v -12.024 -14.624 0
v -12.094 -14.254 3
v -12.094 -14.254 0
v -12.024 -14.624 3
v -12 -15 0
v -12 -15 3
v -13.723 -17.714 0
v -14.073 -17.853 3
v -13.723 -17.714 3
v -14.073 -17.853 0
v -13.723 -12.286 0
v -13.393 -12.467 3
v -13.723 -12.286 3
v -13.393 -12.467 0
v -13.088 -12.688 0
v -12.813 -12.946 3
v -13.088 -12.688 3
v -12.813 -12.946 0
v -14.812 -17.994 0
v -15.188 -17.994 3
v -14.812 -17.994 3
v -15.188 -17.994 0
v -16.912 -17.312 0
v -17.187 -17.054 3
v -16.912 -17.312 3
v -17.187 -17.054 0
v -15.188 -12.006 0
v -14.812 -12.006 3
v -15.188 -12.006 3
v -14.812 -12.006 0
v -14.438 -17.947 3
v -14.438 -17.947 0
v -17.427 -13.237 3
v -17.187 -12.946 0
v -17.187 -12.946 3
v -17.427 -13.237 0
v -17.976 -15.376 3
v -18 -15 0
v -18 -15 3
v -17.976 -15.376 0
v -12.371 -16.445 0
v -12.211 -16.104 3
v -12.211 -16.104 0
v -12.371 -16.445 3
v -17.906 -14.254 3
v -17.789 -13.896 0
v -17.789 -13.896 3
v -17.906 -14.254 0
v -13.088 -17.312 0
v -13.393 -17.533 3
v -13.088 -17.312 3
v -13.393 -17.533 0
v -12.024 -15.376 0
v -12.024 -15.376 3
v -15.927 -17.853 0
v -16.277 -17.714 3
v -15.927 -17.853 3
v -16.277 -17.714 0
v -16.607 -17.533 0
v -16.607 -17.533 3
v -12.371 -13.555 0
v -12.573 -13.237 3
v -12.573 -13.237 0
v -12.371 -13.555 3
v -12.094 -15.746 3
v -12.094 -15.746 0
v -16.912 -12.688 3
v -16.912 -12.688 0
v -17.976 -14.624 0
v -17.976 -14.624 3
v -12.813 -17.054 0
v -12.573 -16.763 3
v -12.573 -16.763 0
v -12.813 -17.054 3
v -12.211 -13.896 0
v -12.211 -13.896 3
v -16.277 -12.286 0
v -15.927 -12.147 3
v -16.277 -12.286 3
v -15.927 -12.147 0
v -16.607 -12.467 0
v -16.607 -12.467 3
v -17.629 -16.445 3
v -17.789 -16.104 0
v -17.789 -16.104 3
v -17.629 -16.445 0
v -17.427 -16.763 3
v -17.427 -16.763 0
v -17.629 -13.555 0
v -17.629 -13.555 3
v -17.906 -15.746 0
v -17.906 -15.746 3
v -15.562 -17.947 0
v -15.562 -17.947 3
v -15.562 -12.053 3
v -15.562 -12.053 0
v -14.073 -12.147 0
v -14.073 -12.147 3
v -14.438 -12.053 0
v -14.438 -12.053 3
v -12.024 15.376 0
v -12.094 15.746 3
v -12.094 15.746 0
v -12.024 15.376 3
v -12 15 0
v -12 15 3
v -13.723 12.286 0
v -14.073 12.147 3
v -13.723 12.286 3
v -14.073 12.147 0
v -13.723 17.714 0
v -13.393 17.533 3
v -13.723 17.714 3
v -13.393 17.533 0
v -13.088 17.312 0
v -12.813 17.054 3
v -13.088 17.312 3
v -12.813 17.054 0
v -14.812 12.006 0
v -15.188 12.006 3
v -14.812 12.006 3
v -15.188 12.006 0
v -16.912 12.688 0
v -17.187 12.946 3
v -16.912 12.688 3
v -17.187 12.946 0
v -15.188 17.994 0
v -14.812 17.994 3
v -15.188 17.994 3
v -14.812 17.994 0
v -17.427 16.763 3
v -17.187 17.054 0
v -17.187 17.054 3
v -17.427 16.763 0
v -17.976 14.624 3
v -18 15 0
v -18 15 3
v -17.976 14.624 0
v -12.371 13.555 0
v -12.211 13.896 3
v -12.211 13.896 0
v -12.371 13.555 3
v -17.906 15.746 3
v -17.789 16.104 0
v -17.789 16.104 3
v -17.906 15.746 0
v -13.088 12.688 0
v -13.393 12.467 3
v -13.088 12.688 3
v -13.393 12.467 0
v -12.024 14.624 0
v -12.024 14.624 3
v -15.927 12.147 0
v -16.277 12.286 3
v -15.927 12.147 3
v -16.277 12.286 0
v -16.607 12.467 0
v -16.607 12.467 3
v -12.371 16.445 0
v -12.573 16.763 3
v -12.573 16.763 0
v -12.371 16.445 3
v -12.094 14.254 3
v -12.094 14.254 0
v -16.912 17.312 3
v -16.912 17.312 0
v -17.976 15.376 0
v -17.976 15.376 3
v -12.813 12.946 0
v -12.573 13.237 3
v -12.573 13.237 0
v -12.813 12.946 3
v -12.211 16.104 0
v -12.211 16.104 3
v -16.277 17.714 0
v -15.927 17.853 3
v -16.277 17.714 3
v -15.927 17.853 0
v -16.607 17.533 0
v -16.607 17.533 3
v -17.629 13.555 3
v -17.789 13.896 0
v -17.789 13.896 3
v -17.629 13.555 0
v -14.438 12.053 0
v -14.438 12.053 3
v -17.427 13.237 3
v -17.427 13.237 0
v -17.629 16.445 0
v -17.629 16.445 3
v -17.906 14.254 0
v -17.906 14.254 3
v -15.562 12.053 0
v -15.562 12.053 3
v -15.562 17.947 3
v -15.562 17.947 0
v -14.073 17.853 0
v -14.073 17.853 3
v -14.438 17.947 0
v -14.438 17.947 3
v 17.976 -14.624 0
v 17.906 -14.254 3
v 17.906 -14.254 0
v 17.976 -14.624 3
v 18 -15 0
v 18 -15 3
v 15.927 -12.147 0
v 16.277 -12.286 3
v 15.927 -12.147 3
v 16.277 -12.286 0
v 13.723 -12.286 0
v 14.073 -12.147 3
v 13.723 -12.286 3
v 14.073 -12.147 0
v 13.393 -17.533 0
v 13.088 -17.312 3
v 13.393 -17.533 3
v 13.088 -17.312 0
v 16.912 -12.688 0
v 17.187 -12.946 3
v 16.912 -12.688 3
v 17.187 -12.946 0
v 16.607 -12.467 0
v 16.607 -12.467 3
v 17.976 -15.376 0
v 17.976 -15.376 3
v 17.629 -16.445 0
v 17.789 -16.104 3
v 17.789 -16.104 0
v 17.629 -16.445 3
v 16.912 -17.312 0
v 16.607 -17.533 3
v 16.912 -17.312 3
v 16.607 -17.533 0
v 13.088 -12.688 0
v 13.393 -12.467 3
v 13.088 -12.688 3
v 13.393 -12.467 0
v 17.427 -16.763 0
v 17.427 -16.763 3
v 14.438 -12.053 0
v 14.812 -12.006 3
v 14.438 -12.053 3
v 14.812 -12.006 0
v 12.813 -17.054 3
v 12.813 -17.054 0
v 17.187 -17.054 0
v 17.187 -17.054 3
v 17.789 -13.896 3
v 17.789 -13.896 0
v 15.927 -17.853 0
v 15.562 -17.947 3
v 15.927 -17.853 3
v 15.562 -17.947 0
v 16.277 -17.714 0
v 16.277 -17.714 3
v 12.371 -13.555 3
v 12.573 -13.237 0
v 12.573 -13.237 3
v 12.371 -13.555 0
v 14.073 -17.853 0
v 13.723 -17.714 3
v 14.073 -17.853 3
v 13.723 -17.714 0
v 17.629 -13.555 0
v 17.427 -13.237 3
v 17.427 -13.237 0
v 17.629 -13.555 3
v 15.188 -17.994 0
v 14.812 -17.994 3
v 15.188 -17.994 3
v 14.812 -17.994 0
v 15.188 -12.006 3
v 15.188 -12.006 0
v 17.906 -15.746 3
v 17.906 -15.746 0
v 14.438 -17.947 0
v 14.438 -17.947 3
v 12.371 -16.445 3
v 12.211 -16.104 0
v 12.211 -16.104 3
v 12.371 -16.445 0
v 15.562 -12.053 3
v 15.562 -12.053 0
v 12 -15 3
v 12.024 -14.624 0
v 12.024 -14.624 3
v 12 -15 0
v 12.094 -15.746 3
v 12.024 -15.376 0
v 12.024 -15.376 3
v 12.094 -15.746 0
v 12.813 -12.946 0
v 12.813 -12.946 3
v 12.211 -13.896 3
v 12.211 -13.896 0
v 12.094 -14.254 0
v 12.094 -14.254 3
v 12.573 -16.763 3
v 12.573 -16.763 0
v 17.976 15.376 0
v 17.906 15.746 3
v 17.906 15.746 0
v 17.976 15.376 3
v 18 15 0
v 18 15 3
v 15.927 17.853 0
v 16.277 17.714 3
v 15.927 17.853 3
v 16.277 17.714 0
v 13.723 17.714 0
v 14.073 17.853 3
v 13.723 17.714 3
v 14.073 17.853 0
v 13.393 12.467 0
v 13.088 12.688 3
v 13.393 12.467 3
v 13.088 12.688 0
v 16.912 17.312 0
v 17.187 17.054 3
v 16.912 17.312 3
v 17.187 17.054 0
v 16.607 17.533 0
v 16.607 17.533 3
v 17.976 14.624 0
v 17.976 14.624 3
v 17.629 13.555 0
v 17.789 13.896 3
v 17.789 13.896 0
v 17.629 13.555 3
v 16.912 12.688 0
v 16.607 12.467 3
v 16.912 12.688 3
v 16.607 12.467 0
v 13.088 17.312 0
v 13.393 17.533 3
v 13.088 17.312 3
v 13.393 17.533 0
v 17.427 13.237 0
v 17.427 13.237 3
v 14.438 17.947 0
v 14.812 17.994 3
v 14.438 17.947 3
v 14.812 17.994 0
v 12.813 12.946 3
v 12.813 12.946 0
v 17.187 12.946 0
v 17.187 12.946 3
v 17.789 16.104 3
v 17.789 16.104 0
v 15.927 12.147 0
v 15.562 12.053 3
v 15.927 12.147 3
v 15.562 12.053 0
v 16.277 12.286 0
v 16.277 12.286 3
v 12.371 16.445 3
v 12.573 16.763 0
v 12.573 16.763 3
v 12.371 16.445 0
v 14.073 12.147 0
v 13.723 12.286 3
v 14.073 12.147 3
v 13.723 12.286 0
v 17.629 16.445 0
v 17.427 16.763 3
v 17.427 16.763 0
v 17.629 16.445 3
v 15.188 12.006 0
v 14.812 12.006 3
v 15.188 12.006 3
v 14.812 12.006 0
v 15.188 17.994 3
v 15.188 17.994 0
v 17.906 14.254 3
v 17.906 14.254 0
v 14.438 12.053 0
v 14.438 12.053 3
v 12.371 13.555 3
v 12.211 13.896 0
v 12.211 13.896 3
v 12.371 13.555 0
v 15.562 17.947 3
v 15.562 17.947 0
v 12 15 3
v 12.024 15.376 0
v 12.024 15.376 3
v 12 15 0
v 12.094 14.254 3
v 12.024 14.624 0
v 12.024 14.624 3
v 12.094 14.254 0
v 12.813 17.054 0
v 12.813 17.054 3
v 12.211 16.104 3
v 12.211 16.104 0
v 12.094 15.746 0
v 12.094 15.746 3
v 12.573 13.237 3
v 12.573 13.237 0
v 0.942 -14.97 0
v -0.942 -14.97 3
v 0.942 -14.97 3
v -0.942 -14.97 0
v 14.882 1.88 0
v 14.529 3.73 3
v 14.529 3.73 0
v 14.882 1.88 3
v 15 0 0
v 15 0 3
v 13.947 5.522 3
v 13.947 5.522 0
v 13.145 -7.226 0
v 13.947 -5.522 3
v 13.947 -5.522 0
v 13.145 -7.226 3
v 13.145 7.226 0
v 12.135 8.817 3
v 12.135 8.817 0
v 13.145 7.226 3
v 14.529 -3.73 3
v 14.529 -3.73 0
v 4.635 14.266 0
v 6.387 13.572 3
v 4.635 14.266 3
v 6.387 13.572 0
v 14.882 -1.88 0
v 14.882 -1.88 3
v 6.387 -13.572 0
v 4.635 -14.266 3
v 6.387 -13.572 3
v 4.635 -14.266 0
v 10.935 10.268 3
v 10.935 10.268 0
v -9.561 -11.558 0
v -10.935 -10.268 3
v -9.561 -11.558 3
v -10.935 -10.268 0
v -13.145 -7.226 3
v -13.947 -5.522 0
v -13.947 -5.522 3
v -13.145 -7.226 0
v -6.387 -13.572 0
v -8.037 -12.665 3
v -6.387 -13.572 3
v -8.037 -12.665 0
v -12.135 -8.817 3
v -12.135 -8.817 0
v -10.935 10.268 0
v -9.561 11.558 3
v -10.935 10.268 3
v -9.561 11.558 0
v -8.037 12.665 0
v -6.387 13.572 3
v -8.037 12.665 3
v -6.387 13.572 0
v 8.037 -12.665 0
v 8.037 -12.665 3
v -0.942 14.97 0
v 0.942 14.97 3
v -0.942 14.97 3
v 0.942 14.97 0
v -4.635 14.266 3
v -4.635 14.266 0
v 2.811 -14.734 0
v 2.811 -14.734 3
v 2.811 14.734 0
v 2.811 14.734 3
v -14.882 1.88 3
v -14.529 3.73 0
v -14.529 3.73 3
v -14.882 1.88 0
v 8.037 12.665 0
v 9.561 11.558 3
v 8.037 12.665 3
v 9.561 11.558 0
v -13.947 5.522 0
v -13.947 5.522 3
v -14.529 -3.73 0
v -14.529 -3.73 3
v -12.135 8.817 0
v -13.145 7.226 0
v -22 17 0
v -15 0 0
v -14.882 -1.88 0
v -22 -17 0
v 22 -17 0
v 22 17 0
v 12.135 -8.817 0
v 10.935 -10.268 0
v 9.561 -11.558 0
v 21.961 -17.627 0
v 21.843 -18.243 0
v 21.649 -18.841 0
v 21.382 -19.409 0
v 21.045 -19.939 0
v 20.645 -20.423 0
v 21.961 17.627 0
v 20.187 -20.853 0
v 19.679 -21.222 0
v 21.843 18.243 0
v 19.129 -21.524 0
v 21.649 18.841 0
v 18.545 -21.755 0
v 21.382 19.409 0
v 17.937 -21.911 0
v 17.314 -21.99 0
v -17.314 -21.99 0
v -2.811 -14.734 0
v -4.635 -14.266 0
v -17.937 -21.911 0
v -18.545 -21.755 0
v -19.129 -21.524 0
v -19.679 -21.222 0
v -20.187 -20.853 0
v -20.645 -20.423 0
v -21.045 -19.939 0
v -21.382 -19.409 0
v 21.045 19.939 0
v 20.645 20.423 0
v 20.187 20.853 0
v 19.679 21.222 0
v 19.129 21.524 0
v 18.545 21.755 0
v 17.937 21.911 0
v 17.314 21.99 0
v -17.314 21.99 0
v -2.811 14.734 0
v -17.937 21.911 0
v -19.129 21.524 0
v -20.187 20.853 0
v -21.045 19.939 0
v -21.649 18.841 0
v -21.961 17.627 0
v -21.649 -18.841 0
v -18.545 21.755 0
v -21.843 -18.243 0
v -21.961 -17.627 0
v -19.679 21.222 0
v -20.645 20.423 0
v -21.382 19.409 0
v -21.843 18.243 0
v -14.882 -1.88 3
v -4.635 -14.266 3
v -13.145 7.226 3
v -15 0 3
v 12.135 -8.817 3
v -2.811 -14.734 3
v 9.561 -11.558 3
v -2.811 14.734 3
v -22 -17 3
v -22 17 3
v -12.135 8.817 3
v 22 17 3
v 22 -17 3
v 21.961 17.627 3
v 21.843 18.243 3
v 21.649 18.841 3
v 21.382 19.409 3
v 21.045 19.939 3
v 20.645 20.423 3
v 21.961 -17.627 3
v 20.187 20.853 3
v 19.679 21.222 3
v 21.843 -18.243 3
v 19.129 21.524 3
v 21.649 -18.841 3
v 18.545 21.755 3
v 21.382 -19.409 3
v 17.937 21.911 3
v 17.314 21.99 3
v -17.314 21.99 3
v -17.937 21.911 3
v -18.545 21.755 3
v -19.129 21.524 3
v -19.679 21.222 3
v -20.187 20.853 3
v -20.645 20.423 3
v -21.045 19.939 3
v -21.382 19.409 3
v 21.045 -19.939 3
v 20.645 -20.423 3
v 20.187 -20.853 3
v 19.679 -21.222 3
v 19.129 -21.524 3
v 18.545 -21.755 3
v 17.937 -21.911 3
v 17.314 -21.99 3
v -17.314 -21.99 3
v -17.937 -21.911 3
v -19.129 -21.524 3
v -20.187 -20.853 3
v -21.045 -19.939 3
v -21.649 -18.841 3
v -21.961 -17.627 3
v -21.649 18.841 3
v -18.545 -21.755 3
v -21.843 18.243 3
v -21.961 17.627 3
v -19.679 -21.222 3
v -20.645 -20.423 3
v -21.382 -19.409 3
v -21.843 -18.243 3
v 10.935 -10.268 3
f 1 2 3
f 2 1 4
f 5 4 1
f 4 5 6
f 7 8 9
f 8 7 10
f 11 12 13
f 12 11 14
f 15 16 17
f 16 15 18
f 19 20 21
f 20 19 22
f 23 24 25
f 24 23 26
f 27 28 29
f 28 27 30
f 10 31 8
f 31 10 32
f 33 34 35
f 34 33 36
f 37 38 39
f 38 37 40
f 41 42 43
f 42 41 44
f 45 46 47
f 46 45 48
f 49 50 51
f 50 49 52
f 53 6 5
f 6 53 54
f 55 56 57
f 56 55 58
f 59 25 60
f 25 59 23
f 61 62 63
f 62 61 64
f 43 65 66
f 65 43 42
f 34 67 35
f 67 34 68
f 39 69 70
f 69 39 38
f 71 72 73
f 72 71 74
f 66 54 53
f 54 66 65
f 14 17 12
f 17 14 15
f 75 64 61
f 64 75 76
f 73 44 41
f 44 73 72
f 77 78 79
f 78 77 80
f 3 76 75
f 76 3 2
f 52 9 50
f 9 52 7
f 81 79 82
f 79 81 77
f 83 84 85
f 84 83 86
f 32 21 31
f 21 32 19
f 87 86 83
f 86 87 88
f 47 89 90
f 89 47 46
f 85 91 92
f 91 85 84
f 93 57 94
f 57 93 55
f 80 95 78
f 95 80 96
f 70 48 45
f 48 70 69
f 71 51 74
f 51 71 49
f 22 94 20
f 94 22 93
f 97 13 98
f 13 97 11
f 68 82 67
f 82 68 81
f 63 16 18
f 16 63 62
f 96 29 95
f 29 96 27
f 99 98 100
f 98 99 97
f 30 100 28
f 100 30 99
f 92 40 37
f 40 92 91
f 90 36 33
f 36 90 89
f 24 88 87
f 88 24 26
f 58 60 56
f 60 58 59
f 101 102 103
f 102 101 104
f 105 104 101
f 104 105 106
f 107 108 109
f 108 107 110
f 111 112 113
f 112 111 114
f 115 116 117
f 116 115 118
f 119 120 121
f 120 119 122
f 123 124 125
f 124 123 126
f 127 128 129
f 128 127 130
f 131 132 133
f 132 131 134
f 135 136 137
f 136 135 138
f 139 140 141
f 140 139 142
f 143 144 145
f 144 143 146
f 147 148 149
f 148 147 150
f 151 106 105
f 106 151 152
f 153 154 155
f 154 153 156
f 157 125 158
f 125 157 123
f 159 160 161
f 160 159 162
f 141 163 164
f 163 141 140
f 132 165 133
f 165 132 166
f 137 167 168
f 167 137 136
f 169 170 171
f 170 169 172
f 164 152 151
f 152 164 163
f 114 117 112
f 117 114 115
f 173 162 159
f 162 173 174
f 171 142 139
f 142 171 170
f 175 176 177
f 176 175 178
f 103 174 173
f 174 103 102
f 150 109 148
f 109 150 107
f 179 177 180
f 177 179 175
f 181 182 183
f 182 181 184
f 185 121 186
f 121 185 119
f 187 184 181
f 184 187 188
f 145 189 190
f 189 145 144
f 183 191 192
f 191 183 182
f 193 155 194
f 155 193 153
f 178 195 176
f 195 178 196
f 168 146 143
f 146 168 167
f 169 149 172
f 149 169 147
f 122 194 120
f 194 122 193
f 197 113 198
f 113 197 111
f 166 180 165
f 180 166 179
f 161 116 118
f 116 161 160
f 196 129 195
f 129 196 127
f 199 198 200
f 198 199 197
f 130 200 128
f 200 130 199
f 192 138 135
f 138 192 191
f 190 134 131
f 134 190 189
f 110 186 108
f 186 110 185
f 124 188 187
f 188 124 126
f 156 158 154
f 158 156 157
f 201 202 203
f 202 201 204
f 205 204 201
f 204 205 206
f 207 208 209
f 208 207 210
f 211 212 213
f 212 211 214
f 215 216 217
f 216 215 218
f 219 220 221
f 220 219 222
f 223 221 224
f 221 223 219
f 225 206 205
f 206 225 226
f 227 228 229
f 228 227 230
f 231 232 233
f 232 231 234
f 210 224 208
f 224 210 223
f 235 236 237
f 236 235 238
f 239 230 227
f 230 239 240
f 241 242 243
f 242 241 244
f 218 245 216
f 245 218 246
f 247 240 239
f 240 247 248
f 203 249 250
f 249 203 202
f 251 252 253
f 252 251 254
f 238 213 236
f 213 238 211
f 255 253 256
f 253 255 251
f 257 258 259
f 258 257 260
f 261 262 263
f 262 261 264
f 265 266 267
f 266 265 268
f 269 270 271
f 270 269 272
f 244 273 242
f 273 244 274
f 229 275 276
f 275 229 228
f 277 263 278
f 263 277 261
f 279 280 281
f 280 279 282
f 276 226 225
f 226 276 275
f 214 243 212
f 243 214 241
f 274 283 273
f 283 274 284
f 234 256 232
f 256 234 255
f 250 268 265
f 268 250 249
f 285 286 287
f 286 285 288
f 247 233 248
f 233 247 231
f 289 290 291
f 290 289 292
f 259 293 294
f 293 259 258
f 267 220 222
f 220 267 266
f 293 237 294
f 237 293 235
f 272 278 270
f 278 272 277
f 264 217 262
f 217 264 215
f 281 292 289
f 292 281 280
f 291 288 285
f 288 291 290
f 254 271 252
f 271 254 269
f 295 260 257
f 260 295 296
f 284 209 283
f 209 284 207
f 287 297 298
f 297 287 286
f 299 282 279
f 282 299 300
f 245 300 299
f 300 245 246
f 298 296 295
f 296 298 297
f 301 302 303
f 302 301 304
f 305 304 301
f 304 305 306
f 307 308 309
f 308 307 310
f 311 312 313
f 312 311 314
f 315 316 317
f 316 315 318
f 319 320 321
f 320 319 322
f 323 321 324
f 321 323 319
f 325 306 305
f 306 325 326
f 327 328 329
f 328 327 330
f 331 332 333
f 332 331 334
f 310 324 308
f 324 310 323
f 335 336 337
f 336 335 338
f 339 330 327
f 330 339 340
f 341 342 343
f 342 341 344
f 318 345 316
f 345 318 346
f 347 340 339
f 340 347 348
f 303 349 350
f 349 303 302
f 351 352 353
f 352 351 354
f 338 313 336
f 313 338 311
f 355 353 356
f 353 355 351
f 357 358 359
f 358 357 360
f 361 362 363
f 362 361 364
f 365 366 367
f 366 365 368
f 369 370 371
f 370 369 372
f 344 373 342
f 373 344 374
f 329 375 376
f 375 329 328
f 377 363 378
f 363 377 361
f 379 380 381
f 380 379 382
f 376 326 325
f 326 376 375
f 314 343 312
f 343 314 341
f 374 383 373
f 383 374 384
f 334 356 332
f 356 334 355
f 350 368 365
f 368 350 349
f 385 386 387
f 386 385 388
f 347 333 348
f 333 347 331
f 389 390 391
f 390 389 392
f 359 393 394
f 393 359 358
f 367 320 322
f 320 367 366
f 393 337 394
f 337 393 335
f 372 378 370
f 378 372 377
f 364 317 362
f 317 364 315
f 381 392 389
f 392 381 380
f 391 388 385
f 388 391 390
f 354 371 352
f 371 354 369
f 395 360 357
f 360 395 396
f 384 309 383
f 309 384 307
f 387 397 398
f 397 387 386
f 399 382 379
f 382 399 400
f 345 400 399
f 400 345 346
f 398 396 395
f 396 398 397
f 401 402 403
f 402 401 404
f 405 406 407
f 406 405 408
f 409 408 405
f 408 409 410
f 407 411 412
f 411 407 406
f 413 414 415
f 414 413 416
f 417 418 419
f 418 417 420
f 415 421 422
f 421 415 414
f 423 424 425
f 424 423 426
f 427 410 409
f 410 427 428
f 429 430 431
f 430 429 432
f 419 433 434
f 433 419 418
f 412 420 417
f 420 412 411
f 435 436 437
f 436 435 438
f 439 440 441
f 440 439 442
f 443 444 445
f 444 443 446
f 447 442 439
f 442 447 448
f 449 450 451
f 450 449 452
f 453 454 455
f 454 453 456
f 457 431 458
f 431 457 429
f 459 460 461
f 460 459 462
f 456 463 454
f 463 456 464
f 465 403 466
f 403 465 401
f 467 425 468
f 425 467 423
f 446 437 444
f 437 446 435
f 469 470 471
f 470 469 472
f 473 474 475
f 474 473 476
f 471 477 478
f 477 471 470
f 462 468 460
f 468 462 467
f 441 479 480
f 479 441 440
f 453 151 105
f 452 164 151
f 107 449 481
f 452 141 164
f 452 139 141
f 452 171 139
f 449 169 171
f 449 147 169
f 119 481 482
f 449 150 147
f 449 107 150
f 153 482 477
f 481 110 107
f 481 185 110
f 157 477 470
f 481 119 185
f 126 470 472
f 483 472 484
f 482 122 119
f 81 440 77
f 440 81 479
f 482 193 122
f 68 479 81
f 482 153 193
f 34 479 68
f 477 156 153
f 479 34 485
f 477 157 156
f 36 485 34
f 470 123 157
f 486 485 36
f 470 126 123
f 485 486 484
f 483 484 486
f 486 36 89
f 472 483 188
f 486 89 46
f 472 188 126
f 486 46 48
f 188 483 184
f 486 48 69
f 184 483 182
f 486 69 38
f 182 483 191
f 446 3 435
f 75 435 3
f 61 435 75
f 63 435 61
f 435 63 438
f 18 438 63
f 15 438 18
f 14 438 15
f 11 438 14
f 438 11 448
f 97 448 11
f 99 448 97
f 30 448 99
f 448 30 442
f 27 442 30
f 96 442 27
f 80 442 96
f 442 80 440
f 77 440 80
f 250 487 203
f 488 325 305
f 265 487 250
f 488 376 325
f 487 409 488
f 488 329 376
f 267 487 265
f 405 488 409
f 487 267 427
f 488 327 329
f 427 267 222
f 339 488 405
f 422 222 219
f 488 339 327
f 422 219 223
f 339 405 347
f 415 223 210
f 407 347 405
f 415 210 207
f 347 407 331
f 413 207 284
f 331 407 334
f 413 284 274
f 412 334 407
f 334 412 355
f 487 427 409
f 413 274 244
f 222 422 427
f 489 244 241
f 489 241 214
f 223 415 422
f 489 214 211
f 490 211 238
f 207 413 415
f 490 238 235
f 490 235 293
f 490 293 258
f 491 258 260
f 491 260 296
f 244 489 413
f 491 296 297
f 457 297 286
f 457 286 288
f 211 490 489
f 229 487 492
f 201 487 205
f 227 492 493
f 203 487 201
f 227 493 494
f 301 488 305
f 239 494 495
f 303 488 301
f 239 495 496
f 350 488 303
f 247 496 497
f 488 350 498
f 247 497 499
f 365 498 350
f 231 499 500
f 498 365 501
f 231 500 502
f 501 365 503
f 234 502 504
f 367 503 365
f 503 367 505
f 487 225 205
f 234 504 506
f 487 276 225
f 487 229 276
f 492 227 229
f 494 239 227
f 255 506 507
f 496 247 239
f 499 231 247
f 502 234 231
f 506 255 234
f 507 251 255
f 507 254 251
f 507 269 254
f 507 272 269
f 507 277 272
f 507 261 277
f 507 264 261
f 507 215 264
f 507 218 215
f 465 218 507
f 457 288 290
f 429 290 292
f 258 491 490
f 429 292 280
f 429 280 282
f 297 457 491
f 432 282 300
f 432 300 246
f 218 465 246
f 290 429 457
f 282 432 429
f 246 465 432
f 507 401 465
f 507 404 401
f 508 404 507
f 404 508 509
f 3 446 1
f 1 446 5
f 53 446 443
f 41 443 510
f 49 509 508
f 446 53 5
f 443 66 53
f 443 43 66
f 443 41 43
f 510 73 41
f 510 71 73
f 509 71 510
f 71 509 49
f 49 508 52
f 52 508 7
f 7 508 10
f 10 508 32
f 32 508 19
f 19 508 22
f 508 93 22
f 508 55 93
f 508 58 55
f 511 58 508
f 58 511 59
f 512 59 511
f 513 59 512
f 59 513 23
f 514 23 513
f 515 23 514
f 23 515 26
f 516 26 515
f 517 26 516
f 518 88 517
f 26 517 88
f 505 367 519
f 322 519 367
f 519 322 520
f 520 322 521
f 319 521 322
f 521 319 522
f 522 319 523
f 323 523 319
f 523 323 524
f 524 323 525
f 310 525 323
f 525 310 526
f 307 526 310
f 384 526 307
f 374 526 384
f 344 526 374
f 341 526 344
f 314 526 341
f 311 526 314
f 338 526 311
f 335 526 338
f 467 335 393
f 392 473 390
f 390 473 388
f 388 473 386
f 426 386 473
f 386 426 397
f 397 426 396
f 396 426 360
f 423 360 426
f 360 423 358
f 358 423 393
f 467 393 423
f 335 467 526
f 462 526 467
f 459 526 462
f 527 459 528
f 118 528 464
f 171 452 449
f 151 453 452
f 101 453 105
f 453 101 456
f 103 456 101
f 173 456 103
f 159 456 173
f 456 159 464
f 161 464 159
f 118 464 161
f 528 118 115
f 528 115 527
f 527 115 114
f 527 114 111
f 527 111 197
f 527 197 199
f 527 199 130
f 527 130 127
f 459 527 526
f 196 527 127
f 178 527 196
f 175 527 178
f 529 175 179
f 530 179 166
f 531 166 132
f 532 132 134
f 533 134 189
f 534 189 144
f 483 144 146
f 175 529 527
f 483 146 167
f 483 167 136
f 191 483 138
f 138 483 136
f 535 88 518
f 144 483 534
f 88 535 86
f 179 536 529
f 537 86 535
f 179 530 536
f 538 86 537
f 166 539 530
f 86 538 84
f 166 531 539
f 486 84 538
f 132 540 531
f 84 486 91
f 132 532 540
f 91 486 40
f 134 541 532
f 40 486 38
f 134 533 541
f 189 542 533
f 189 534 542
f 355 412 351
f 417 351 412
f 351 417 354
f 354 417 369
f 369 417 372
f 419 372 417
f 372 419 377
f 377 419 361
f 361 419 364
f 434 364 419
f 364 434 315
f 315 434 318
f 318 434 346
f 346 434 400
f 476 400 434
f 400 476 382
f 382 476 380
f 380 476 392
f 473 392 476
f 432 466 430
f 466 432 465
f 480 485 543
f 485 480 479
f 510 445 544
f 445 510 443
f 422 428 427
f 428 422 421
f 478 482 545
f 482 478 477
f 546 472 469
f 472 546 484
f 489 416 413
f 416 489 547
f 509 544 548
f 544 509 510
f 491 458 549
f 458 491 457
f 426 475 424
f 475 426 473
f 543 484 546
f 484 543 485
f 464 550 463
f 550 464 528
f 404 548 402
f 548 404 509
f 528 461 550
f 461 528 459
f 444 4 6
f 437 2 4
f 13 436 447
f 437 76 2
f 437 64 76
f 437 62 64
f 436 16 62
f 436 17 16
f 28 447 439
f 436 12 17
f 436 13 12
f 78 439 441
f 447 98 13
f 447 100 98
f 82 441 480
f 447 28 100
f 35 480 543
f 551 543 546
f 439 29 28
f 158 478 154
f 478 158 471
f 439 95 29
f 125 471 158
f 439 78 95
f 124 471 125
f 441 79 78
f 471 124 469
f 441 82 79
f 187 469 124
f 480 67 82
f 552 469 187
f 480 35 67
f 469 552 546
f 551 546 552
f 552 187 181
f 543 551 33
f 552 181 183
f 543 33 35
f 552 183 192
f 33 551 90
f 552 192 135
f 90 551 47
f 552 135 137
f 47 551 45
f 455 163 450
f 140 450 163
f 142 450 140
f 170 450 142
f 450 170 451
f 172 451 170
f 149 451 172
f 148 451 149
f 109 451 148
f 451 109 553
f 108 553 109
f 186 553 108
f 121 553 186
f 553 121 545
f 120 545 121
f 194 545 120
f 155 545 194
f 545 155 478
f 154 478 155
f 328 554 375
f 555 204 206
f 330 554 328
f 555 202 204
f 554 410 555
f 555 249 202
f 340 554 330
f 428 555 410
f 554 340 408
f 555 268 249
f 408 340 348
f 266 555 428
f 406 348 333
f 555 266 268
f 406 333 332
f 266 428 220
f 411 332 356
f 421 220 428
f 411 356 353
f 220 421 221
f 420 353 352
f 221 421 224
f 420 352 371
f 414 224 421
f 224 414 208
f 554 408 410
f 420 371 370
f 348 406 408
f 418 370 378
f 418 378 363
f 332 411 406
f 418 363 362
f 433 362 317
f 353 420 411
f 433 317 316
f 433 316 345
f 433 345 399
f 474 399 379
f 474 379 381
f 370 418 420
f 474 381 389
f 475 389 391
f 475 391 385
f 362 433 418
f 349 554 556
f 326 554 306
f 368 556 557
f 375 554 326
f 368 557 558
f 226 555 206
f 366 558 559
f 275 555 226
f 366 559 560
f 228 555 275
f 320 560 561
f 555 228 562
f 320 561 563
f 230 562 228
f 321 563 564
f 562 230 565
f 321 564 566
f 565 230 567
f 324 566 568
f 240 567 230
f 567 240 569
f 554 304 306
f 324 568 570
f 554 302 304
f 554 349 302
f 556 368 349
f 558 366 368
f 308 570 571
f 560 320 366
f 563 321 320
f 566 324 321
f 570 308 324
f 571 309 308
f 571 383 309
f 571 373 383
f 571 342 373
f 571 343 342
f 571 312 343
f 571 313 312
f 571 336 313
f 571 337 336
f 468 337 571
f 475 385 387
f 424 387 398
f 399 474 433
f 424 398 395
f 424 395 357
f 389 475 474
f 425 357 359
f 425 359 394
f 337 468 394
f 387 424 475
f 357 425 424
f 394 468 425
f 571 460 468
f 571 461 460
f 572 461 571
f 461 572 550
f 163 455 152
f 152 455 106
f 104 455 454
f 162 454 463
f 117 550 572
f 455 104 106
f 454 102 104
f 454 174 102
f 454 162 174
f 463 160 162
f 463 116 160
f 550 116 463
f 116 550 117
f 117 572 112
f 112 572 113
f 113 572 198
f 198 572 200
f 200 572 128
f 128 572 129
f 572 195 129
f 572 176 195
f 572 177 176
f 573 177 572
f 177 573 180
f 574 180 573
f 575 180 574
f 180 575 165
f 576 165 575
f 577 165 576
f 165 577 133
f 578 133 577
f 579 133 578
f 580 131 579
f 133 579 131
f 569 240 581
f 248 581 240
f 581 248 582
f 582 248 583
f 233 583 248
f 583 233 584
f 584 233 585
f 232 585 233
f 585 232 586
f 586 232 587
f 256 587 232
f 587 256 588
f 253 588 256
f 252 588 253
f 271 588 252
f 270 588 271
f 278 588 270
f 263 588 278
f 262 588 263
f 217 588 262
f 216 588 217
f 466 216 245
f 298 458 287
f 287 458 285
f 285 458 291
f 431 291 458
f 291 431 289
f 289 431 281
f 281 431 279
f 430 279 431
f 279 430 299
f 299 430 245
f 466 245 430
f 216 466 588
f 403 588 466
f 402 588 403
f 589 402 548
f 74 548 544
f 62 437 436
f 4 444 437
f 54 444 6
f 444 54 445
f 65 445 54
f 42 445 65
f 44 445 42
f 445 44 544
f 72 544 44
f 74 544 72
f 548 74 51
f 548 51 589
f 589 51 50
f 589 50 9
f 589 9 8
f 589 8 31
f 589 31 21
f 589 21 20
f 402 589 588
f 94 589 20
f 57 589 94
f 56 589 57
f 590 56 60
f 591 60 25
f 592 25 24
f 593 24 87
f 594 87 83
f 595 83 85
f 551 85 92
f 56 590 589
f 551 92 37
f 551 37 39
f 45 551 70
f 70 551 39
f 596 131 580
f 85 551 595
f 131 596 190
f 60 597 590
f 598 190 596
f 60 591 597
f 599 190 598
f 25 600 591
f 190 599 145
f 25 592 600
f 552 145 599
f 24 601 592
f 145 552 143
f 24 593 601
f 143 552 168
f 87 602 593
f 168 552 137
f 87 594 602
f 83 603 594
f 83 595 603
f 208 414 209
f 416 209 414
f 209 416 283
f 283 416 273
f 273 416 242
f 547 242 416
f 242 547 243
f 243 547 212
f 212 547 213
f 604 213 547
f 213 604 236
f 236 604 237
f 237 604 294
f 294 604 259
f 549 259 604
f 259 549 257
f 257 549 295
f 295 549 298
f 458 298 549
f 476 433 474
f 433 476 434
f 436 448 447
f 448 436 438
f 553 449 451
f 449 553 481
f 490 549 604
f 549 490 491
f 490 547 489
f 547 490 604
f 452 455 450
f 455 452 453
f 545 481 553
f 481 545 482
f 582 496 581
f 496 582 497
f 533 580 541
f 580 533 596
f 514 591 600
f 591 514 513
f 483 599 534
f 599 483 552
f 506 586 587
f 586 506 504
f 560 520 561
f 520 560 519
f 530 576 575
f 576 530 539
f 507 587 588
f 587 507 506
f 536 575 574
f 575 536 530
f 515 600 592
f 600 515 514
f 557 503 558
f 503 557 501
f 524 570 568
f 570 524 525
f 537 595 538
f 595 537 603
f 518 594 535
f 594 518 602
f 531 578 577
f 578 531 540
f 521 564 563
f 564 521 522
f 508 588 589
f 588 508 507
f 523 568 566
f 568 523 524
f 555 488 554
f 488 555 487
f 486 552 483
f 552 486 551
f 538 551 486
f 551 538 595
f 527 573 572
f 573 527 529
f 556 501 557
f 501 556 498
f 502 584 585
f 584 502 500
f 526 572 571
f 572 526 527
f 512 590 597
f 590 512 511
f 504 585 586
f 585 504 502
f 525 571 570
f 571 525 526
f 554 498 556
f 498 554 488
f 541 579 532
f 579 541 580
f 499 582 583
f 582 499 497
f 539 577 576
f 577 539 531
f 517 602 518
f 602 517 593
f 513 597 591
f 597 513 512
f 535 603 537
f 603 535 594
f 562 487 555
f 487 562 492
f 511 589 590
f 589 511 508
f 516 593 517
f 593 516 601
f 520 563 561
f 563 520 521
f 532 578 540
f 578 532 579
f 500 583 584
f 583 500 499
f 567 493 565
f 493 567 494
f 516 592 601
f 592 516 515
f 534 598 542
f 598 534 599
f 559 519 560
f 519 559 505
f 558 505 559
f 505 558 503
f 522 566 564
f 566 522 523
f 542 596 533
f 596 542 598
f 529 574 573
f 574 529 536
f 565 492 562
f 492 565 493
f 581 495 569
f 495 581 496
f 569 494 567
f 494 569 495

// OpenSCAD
$fn = 50;

difference() {
	union() {
		hull() {
			translate(v = [-17.0, 17.0, 0]) {
				cylinder(h = 3, r = 5);
			}
			translate(v = [17.0, 17.0, 0]) {
				cylinder(h = 3, r = 5);
			}
			translate(v = [-17.0, -17.0, 0]) {
				cylinder(h = 3, r = 5);
			}
			translate(v = [17.0, -17.0, 0]) {
				cylinder(h = 3, r = 5);
			}
		}
	}
	union() {
		translate(v = [-15.0, -15.0, -100.0]) {
			cylinder(h = 200, r = 3.0);
		}
		translate(v = [-15.0, 15.0, -100.0]) {
			cylinder(h = 200, r = 3.0);
		}
		translate(v = [15.0, -15.0, -100.0]) {
			cylinder(h = 200, r = 3.0);
		}
		translate(v = [15.0, 15.0, -100.0]) {
			cylinder(h = 200, r = 3.0);
		}
		translate(v = [-15.0, -15.0, -100.0]) {
			cylinder(h = 200, r = 1.5);
		}
		translate(v = [-15.0, 15.0, -100.0]) {
			cylinder(h = 200, r = 1.5);
		}
		translate(v = [15.0, -15.0, -100.0]) {
			cylinder(h = 200, r = 1.5);
		}
		translate(v = [15.0, 15.0, -100.0]) {
			cylinder(h = 200, r = 1.5);
		}
		cylinder(h = 3, r = 15.0);
	}
}
